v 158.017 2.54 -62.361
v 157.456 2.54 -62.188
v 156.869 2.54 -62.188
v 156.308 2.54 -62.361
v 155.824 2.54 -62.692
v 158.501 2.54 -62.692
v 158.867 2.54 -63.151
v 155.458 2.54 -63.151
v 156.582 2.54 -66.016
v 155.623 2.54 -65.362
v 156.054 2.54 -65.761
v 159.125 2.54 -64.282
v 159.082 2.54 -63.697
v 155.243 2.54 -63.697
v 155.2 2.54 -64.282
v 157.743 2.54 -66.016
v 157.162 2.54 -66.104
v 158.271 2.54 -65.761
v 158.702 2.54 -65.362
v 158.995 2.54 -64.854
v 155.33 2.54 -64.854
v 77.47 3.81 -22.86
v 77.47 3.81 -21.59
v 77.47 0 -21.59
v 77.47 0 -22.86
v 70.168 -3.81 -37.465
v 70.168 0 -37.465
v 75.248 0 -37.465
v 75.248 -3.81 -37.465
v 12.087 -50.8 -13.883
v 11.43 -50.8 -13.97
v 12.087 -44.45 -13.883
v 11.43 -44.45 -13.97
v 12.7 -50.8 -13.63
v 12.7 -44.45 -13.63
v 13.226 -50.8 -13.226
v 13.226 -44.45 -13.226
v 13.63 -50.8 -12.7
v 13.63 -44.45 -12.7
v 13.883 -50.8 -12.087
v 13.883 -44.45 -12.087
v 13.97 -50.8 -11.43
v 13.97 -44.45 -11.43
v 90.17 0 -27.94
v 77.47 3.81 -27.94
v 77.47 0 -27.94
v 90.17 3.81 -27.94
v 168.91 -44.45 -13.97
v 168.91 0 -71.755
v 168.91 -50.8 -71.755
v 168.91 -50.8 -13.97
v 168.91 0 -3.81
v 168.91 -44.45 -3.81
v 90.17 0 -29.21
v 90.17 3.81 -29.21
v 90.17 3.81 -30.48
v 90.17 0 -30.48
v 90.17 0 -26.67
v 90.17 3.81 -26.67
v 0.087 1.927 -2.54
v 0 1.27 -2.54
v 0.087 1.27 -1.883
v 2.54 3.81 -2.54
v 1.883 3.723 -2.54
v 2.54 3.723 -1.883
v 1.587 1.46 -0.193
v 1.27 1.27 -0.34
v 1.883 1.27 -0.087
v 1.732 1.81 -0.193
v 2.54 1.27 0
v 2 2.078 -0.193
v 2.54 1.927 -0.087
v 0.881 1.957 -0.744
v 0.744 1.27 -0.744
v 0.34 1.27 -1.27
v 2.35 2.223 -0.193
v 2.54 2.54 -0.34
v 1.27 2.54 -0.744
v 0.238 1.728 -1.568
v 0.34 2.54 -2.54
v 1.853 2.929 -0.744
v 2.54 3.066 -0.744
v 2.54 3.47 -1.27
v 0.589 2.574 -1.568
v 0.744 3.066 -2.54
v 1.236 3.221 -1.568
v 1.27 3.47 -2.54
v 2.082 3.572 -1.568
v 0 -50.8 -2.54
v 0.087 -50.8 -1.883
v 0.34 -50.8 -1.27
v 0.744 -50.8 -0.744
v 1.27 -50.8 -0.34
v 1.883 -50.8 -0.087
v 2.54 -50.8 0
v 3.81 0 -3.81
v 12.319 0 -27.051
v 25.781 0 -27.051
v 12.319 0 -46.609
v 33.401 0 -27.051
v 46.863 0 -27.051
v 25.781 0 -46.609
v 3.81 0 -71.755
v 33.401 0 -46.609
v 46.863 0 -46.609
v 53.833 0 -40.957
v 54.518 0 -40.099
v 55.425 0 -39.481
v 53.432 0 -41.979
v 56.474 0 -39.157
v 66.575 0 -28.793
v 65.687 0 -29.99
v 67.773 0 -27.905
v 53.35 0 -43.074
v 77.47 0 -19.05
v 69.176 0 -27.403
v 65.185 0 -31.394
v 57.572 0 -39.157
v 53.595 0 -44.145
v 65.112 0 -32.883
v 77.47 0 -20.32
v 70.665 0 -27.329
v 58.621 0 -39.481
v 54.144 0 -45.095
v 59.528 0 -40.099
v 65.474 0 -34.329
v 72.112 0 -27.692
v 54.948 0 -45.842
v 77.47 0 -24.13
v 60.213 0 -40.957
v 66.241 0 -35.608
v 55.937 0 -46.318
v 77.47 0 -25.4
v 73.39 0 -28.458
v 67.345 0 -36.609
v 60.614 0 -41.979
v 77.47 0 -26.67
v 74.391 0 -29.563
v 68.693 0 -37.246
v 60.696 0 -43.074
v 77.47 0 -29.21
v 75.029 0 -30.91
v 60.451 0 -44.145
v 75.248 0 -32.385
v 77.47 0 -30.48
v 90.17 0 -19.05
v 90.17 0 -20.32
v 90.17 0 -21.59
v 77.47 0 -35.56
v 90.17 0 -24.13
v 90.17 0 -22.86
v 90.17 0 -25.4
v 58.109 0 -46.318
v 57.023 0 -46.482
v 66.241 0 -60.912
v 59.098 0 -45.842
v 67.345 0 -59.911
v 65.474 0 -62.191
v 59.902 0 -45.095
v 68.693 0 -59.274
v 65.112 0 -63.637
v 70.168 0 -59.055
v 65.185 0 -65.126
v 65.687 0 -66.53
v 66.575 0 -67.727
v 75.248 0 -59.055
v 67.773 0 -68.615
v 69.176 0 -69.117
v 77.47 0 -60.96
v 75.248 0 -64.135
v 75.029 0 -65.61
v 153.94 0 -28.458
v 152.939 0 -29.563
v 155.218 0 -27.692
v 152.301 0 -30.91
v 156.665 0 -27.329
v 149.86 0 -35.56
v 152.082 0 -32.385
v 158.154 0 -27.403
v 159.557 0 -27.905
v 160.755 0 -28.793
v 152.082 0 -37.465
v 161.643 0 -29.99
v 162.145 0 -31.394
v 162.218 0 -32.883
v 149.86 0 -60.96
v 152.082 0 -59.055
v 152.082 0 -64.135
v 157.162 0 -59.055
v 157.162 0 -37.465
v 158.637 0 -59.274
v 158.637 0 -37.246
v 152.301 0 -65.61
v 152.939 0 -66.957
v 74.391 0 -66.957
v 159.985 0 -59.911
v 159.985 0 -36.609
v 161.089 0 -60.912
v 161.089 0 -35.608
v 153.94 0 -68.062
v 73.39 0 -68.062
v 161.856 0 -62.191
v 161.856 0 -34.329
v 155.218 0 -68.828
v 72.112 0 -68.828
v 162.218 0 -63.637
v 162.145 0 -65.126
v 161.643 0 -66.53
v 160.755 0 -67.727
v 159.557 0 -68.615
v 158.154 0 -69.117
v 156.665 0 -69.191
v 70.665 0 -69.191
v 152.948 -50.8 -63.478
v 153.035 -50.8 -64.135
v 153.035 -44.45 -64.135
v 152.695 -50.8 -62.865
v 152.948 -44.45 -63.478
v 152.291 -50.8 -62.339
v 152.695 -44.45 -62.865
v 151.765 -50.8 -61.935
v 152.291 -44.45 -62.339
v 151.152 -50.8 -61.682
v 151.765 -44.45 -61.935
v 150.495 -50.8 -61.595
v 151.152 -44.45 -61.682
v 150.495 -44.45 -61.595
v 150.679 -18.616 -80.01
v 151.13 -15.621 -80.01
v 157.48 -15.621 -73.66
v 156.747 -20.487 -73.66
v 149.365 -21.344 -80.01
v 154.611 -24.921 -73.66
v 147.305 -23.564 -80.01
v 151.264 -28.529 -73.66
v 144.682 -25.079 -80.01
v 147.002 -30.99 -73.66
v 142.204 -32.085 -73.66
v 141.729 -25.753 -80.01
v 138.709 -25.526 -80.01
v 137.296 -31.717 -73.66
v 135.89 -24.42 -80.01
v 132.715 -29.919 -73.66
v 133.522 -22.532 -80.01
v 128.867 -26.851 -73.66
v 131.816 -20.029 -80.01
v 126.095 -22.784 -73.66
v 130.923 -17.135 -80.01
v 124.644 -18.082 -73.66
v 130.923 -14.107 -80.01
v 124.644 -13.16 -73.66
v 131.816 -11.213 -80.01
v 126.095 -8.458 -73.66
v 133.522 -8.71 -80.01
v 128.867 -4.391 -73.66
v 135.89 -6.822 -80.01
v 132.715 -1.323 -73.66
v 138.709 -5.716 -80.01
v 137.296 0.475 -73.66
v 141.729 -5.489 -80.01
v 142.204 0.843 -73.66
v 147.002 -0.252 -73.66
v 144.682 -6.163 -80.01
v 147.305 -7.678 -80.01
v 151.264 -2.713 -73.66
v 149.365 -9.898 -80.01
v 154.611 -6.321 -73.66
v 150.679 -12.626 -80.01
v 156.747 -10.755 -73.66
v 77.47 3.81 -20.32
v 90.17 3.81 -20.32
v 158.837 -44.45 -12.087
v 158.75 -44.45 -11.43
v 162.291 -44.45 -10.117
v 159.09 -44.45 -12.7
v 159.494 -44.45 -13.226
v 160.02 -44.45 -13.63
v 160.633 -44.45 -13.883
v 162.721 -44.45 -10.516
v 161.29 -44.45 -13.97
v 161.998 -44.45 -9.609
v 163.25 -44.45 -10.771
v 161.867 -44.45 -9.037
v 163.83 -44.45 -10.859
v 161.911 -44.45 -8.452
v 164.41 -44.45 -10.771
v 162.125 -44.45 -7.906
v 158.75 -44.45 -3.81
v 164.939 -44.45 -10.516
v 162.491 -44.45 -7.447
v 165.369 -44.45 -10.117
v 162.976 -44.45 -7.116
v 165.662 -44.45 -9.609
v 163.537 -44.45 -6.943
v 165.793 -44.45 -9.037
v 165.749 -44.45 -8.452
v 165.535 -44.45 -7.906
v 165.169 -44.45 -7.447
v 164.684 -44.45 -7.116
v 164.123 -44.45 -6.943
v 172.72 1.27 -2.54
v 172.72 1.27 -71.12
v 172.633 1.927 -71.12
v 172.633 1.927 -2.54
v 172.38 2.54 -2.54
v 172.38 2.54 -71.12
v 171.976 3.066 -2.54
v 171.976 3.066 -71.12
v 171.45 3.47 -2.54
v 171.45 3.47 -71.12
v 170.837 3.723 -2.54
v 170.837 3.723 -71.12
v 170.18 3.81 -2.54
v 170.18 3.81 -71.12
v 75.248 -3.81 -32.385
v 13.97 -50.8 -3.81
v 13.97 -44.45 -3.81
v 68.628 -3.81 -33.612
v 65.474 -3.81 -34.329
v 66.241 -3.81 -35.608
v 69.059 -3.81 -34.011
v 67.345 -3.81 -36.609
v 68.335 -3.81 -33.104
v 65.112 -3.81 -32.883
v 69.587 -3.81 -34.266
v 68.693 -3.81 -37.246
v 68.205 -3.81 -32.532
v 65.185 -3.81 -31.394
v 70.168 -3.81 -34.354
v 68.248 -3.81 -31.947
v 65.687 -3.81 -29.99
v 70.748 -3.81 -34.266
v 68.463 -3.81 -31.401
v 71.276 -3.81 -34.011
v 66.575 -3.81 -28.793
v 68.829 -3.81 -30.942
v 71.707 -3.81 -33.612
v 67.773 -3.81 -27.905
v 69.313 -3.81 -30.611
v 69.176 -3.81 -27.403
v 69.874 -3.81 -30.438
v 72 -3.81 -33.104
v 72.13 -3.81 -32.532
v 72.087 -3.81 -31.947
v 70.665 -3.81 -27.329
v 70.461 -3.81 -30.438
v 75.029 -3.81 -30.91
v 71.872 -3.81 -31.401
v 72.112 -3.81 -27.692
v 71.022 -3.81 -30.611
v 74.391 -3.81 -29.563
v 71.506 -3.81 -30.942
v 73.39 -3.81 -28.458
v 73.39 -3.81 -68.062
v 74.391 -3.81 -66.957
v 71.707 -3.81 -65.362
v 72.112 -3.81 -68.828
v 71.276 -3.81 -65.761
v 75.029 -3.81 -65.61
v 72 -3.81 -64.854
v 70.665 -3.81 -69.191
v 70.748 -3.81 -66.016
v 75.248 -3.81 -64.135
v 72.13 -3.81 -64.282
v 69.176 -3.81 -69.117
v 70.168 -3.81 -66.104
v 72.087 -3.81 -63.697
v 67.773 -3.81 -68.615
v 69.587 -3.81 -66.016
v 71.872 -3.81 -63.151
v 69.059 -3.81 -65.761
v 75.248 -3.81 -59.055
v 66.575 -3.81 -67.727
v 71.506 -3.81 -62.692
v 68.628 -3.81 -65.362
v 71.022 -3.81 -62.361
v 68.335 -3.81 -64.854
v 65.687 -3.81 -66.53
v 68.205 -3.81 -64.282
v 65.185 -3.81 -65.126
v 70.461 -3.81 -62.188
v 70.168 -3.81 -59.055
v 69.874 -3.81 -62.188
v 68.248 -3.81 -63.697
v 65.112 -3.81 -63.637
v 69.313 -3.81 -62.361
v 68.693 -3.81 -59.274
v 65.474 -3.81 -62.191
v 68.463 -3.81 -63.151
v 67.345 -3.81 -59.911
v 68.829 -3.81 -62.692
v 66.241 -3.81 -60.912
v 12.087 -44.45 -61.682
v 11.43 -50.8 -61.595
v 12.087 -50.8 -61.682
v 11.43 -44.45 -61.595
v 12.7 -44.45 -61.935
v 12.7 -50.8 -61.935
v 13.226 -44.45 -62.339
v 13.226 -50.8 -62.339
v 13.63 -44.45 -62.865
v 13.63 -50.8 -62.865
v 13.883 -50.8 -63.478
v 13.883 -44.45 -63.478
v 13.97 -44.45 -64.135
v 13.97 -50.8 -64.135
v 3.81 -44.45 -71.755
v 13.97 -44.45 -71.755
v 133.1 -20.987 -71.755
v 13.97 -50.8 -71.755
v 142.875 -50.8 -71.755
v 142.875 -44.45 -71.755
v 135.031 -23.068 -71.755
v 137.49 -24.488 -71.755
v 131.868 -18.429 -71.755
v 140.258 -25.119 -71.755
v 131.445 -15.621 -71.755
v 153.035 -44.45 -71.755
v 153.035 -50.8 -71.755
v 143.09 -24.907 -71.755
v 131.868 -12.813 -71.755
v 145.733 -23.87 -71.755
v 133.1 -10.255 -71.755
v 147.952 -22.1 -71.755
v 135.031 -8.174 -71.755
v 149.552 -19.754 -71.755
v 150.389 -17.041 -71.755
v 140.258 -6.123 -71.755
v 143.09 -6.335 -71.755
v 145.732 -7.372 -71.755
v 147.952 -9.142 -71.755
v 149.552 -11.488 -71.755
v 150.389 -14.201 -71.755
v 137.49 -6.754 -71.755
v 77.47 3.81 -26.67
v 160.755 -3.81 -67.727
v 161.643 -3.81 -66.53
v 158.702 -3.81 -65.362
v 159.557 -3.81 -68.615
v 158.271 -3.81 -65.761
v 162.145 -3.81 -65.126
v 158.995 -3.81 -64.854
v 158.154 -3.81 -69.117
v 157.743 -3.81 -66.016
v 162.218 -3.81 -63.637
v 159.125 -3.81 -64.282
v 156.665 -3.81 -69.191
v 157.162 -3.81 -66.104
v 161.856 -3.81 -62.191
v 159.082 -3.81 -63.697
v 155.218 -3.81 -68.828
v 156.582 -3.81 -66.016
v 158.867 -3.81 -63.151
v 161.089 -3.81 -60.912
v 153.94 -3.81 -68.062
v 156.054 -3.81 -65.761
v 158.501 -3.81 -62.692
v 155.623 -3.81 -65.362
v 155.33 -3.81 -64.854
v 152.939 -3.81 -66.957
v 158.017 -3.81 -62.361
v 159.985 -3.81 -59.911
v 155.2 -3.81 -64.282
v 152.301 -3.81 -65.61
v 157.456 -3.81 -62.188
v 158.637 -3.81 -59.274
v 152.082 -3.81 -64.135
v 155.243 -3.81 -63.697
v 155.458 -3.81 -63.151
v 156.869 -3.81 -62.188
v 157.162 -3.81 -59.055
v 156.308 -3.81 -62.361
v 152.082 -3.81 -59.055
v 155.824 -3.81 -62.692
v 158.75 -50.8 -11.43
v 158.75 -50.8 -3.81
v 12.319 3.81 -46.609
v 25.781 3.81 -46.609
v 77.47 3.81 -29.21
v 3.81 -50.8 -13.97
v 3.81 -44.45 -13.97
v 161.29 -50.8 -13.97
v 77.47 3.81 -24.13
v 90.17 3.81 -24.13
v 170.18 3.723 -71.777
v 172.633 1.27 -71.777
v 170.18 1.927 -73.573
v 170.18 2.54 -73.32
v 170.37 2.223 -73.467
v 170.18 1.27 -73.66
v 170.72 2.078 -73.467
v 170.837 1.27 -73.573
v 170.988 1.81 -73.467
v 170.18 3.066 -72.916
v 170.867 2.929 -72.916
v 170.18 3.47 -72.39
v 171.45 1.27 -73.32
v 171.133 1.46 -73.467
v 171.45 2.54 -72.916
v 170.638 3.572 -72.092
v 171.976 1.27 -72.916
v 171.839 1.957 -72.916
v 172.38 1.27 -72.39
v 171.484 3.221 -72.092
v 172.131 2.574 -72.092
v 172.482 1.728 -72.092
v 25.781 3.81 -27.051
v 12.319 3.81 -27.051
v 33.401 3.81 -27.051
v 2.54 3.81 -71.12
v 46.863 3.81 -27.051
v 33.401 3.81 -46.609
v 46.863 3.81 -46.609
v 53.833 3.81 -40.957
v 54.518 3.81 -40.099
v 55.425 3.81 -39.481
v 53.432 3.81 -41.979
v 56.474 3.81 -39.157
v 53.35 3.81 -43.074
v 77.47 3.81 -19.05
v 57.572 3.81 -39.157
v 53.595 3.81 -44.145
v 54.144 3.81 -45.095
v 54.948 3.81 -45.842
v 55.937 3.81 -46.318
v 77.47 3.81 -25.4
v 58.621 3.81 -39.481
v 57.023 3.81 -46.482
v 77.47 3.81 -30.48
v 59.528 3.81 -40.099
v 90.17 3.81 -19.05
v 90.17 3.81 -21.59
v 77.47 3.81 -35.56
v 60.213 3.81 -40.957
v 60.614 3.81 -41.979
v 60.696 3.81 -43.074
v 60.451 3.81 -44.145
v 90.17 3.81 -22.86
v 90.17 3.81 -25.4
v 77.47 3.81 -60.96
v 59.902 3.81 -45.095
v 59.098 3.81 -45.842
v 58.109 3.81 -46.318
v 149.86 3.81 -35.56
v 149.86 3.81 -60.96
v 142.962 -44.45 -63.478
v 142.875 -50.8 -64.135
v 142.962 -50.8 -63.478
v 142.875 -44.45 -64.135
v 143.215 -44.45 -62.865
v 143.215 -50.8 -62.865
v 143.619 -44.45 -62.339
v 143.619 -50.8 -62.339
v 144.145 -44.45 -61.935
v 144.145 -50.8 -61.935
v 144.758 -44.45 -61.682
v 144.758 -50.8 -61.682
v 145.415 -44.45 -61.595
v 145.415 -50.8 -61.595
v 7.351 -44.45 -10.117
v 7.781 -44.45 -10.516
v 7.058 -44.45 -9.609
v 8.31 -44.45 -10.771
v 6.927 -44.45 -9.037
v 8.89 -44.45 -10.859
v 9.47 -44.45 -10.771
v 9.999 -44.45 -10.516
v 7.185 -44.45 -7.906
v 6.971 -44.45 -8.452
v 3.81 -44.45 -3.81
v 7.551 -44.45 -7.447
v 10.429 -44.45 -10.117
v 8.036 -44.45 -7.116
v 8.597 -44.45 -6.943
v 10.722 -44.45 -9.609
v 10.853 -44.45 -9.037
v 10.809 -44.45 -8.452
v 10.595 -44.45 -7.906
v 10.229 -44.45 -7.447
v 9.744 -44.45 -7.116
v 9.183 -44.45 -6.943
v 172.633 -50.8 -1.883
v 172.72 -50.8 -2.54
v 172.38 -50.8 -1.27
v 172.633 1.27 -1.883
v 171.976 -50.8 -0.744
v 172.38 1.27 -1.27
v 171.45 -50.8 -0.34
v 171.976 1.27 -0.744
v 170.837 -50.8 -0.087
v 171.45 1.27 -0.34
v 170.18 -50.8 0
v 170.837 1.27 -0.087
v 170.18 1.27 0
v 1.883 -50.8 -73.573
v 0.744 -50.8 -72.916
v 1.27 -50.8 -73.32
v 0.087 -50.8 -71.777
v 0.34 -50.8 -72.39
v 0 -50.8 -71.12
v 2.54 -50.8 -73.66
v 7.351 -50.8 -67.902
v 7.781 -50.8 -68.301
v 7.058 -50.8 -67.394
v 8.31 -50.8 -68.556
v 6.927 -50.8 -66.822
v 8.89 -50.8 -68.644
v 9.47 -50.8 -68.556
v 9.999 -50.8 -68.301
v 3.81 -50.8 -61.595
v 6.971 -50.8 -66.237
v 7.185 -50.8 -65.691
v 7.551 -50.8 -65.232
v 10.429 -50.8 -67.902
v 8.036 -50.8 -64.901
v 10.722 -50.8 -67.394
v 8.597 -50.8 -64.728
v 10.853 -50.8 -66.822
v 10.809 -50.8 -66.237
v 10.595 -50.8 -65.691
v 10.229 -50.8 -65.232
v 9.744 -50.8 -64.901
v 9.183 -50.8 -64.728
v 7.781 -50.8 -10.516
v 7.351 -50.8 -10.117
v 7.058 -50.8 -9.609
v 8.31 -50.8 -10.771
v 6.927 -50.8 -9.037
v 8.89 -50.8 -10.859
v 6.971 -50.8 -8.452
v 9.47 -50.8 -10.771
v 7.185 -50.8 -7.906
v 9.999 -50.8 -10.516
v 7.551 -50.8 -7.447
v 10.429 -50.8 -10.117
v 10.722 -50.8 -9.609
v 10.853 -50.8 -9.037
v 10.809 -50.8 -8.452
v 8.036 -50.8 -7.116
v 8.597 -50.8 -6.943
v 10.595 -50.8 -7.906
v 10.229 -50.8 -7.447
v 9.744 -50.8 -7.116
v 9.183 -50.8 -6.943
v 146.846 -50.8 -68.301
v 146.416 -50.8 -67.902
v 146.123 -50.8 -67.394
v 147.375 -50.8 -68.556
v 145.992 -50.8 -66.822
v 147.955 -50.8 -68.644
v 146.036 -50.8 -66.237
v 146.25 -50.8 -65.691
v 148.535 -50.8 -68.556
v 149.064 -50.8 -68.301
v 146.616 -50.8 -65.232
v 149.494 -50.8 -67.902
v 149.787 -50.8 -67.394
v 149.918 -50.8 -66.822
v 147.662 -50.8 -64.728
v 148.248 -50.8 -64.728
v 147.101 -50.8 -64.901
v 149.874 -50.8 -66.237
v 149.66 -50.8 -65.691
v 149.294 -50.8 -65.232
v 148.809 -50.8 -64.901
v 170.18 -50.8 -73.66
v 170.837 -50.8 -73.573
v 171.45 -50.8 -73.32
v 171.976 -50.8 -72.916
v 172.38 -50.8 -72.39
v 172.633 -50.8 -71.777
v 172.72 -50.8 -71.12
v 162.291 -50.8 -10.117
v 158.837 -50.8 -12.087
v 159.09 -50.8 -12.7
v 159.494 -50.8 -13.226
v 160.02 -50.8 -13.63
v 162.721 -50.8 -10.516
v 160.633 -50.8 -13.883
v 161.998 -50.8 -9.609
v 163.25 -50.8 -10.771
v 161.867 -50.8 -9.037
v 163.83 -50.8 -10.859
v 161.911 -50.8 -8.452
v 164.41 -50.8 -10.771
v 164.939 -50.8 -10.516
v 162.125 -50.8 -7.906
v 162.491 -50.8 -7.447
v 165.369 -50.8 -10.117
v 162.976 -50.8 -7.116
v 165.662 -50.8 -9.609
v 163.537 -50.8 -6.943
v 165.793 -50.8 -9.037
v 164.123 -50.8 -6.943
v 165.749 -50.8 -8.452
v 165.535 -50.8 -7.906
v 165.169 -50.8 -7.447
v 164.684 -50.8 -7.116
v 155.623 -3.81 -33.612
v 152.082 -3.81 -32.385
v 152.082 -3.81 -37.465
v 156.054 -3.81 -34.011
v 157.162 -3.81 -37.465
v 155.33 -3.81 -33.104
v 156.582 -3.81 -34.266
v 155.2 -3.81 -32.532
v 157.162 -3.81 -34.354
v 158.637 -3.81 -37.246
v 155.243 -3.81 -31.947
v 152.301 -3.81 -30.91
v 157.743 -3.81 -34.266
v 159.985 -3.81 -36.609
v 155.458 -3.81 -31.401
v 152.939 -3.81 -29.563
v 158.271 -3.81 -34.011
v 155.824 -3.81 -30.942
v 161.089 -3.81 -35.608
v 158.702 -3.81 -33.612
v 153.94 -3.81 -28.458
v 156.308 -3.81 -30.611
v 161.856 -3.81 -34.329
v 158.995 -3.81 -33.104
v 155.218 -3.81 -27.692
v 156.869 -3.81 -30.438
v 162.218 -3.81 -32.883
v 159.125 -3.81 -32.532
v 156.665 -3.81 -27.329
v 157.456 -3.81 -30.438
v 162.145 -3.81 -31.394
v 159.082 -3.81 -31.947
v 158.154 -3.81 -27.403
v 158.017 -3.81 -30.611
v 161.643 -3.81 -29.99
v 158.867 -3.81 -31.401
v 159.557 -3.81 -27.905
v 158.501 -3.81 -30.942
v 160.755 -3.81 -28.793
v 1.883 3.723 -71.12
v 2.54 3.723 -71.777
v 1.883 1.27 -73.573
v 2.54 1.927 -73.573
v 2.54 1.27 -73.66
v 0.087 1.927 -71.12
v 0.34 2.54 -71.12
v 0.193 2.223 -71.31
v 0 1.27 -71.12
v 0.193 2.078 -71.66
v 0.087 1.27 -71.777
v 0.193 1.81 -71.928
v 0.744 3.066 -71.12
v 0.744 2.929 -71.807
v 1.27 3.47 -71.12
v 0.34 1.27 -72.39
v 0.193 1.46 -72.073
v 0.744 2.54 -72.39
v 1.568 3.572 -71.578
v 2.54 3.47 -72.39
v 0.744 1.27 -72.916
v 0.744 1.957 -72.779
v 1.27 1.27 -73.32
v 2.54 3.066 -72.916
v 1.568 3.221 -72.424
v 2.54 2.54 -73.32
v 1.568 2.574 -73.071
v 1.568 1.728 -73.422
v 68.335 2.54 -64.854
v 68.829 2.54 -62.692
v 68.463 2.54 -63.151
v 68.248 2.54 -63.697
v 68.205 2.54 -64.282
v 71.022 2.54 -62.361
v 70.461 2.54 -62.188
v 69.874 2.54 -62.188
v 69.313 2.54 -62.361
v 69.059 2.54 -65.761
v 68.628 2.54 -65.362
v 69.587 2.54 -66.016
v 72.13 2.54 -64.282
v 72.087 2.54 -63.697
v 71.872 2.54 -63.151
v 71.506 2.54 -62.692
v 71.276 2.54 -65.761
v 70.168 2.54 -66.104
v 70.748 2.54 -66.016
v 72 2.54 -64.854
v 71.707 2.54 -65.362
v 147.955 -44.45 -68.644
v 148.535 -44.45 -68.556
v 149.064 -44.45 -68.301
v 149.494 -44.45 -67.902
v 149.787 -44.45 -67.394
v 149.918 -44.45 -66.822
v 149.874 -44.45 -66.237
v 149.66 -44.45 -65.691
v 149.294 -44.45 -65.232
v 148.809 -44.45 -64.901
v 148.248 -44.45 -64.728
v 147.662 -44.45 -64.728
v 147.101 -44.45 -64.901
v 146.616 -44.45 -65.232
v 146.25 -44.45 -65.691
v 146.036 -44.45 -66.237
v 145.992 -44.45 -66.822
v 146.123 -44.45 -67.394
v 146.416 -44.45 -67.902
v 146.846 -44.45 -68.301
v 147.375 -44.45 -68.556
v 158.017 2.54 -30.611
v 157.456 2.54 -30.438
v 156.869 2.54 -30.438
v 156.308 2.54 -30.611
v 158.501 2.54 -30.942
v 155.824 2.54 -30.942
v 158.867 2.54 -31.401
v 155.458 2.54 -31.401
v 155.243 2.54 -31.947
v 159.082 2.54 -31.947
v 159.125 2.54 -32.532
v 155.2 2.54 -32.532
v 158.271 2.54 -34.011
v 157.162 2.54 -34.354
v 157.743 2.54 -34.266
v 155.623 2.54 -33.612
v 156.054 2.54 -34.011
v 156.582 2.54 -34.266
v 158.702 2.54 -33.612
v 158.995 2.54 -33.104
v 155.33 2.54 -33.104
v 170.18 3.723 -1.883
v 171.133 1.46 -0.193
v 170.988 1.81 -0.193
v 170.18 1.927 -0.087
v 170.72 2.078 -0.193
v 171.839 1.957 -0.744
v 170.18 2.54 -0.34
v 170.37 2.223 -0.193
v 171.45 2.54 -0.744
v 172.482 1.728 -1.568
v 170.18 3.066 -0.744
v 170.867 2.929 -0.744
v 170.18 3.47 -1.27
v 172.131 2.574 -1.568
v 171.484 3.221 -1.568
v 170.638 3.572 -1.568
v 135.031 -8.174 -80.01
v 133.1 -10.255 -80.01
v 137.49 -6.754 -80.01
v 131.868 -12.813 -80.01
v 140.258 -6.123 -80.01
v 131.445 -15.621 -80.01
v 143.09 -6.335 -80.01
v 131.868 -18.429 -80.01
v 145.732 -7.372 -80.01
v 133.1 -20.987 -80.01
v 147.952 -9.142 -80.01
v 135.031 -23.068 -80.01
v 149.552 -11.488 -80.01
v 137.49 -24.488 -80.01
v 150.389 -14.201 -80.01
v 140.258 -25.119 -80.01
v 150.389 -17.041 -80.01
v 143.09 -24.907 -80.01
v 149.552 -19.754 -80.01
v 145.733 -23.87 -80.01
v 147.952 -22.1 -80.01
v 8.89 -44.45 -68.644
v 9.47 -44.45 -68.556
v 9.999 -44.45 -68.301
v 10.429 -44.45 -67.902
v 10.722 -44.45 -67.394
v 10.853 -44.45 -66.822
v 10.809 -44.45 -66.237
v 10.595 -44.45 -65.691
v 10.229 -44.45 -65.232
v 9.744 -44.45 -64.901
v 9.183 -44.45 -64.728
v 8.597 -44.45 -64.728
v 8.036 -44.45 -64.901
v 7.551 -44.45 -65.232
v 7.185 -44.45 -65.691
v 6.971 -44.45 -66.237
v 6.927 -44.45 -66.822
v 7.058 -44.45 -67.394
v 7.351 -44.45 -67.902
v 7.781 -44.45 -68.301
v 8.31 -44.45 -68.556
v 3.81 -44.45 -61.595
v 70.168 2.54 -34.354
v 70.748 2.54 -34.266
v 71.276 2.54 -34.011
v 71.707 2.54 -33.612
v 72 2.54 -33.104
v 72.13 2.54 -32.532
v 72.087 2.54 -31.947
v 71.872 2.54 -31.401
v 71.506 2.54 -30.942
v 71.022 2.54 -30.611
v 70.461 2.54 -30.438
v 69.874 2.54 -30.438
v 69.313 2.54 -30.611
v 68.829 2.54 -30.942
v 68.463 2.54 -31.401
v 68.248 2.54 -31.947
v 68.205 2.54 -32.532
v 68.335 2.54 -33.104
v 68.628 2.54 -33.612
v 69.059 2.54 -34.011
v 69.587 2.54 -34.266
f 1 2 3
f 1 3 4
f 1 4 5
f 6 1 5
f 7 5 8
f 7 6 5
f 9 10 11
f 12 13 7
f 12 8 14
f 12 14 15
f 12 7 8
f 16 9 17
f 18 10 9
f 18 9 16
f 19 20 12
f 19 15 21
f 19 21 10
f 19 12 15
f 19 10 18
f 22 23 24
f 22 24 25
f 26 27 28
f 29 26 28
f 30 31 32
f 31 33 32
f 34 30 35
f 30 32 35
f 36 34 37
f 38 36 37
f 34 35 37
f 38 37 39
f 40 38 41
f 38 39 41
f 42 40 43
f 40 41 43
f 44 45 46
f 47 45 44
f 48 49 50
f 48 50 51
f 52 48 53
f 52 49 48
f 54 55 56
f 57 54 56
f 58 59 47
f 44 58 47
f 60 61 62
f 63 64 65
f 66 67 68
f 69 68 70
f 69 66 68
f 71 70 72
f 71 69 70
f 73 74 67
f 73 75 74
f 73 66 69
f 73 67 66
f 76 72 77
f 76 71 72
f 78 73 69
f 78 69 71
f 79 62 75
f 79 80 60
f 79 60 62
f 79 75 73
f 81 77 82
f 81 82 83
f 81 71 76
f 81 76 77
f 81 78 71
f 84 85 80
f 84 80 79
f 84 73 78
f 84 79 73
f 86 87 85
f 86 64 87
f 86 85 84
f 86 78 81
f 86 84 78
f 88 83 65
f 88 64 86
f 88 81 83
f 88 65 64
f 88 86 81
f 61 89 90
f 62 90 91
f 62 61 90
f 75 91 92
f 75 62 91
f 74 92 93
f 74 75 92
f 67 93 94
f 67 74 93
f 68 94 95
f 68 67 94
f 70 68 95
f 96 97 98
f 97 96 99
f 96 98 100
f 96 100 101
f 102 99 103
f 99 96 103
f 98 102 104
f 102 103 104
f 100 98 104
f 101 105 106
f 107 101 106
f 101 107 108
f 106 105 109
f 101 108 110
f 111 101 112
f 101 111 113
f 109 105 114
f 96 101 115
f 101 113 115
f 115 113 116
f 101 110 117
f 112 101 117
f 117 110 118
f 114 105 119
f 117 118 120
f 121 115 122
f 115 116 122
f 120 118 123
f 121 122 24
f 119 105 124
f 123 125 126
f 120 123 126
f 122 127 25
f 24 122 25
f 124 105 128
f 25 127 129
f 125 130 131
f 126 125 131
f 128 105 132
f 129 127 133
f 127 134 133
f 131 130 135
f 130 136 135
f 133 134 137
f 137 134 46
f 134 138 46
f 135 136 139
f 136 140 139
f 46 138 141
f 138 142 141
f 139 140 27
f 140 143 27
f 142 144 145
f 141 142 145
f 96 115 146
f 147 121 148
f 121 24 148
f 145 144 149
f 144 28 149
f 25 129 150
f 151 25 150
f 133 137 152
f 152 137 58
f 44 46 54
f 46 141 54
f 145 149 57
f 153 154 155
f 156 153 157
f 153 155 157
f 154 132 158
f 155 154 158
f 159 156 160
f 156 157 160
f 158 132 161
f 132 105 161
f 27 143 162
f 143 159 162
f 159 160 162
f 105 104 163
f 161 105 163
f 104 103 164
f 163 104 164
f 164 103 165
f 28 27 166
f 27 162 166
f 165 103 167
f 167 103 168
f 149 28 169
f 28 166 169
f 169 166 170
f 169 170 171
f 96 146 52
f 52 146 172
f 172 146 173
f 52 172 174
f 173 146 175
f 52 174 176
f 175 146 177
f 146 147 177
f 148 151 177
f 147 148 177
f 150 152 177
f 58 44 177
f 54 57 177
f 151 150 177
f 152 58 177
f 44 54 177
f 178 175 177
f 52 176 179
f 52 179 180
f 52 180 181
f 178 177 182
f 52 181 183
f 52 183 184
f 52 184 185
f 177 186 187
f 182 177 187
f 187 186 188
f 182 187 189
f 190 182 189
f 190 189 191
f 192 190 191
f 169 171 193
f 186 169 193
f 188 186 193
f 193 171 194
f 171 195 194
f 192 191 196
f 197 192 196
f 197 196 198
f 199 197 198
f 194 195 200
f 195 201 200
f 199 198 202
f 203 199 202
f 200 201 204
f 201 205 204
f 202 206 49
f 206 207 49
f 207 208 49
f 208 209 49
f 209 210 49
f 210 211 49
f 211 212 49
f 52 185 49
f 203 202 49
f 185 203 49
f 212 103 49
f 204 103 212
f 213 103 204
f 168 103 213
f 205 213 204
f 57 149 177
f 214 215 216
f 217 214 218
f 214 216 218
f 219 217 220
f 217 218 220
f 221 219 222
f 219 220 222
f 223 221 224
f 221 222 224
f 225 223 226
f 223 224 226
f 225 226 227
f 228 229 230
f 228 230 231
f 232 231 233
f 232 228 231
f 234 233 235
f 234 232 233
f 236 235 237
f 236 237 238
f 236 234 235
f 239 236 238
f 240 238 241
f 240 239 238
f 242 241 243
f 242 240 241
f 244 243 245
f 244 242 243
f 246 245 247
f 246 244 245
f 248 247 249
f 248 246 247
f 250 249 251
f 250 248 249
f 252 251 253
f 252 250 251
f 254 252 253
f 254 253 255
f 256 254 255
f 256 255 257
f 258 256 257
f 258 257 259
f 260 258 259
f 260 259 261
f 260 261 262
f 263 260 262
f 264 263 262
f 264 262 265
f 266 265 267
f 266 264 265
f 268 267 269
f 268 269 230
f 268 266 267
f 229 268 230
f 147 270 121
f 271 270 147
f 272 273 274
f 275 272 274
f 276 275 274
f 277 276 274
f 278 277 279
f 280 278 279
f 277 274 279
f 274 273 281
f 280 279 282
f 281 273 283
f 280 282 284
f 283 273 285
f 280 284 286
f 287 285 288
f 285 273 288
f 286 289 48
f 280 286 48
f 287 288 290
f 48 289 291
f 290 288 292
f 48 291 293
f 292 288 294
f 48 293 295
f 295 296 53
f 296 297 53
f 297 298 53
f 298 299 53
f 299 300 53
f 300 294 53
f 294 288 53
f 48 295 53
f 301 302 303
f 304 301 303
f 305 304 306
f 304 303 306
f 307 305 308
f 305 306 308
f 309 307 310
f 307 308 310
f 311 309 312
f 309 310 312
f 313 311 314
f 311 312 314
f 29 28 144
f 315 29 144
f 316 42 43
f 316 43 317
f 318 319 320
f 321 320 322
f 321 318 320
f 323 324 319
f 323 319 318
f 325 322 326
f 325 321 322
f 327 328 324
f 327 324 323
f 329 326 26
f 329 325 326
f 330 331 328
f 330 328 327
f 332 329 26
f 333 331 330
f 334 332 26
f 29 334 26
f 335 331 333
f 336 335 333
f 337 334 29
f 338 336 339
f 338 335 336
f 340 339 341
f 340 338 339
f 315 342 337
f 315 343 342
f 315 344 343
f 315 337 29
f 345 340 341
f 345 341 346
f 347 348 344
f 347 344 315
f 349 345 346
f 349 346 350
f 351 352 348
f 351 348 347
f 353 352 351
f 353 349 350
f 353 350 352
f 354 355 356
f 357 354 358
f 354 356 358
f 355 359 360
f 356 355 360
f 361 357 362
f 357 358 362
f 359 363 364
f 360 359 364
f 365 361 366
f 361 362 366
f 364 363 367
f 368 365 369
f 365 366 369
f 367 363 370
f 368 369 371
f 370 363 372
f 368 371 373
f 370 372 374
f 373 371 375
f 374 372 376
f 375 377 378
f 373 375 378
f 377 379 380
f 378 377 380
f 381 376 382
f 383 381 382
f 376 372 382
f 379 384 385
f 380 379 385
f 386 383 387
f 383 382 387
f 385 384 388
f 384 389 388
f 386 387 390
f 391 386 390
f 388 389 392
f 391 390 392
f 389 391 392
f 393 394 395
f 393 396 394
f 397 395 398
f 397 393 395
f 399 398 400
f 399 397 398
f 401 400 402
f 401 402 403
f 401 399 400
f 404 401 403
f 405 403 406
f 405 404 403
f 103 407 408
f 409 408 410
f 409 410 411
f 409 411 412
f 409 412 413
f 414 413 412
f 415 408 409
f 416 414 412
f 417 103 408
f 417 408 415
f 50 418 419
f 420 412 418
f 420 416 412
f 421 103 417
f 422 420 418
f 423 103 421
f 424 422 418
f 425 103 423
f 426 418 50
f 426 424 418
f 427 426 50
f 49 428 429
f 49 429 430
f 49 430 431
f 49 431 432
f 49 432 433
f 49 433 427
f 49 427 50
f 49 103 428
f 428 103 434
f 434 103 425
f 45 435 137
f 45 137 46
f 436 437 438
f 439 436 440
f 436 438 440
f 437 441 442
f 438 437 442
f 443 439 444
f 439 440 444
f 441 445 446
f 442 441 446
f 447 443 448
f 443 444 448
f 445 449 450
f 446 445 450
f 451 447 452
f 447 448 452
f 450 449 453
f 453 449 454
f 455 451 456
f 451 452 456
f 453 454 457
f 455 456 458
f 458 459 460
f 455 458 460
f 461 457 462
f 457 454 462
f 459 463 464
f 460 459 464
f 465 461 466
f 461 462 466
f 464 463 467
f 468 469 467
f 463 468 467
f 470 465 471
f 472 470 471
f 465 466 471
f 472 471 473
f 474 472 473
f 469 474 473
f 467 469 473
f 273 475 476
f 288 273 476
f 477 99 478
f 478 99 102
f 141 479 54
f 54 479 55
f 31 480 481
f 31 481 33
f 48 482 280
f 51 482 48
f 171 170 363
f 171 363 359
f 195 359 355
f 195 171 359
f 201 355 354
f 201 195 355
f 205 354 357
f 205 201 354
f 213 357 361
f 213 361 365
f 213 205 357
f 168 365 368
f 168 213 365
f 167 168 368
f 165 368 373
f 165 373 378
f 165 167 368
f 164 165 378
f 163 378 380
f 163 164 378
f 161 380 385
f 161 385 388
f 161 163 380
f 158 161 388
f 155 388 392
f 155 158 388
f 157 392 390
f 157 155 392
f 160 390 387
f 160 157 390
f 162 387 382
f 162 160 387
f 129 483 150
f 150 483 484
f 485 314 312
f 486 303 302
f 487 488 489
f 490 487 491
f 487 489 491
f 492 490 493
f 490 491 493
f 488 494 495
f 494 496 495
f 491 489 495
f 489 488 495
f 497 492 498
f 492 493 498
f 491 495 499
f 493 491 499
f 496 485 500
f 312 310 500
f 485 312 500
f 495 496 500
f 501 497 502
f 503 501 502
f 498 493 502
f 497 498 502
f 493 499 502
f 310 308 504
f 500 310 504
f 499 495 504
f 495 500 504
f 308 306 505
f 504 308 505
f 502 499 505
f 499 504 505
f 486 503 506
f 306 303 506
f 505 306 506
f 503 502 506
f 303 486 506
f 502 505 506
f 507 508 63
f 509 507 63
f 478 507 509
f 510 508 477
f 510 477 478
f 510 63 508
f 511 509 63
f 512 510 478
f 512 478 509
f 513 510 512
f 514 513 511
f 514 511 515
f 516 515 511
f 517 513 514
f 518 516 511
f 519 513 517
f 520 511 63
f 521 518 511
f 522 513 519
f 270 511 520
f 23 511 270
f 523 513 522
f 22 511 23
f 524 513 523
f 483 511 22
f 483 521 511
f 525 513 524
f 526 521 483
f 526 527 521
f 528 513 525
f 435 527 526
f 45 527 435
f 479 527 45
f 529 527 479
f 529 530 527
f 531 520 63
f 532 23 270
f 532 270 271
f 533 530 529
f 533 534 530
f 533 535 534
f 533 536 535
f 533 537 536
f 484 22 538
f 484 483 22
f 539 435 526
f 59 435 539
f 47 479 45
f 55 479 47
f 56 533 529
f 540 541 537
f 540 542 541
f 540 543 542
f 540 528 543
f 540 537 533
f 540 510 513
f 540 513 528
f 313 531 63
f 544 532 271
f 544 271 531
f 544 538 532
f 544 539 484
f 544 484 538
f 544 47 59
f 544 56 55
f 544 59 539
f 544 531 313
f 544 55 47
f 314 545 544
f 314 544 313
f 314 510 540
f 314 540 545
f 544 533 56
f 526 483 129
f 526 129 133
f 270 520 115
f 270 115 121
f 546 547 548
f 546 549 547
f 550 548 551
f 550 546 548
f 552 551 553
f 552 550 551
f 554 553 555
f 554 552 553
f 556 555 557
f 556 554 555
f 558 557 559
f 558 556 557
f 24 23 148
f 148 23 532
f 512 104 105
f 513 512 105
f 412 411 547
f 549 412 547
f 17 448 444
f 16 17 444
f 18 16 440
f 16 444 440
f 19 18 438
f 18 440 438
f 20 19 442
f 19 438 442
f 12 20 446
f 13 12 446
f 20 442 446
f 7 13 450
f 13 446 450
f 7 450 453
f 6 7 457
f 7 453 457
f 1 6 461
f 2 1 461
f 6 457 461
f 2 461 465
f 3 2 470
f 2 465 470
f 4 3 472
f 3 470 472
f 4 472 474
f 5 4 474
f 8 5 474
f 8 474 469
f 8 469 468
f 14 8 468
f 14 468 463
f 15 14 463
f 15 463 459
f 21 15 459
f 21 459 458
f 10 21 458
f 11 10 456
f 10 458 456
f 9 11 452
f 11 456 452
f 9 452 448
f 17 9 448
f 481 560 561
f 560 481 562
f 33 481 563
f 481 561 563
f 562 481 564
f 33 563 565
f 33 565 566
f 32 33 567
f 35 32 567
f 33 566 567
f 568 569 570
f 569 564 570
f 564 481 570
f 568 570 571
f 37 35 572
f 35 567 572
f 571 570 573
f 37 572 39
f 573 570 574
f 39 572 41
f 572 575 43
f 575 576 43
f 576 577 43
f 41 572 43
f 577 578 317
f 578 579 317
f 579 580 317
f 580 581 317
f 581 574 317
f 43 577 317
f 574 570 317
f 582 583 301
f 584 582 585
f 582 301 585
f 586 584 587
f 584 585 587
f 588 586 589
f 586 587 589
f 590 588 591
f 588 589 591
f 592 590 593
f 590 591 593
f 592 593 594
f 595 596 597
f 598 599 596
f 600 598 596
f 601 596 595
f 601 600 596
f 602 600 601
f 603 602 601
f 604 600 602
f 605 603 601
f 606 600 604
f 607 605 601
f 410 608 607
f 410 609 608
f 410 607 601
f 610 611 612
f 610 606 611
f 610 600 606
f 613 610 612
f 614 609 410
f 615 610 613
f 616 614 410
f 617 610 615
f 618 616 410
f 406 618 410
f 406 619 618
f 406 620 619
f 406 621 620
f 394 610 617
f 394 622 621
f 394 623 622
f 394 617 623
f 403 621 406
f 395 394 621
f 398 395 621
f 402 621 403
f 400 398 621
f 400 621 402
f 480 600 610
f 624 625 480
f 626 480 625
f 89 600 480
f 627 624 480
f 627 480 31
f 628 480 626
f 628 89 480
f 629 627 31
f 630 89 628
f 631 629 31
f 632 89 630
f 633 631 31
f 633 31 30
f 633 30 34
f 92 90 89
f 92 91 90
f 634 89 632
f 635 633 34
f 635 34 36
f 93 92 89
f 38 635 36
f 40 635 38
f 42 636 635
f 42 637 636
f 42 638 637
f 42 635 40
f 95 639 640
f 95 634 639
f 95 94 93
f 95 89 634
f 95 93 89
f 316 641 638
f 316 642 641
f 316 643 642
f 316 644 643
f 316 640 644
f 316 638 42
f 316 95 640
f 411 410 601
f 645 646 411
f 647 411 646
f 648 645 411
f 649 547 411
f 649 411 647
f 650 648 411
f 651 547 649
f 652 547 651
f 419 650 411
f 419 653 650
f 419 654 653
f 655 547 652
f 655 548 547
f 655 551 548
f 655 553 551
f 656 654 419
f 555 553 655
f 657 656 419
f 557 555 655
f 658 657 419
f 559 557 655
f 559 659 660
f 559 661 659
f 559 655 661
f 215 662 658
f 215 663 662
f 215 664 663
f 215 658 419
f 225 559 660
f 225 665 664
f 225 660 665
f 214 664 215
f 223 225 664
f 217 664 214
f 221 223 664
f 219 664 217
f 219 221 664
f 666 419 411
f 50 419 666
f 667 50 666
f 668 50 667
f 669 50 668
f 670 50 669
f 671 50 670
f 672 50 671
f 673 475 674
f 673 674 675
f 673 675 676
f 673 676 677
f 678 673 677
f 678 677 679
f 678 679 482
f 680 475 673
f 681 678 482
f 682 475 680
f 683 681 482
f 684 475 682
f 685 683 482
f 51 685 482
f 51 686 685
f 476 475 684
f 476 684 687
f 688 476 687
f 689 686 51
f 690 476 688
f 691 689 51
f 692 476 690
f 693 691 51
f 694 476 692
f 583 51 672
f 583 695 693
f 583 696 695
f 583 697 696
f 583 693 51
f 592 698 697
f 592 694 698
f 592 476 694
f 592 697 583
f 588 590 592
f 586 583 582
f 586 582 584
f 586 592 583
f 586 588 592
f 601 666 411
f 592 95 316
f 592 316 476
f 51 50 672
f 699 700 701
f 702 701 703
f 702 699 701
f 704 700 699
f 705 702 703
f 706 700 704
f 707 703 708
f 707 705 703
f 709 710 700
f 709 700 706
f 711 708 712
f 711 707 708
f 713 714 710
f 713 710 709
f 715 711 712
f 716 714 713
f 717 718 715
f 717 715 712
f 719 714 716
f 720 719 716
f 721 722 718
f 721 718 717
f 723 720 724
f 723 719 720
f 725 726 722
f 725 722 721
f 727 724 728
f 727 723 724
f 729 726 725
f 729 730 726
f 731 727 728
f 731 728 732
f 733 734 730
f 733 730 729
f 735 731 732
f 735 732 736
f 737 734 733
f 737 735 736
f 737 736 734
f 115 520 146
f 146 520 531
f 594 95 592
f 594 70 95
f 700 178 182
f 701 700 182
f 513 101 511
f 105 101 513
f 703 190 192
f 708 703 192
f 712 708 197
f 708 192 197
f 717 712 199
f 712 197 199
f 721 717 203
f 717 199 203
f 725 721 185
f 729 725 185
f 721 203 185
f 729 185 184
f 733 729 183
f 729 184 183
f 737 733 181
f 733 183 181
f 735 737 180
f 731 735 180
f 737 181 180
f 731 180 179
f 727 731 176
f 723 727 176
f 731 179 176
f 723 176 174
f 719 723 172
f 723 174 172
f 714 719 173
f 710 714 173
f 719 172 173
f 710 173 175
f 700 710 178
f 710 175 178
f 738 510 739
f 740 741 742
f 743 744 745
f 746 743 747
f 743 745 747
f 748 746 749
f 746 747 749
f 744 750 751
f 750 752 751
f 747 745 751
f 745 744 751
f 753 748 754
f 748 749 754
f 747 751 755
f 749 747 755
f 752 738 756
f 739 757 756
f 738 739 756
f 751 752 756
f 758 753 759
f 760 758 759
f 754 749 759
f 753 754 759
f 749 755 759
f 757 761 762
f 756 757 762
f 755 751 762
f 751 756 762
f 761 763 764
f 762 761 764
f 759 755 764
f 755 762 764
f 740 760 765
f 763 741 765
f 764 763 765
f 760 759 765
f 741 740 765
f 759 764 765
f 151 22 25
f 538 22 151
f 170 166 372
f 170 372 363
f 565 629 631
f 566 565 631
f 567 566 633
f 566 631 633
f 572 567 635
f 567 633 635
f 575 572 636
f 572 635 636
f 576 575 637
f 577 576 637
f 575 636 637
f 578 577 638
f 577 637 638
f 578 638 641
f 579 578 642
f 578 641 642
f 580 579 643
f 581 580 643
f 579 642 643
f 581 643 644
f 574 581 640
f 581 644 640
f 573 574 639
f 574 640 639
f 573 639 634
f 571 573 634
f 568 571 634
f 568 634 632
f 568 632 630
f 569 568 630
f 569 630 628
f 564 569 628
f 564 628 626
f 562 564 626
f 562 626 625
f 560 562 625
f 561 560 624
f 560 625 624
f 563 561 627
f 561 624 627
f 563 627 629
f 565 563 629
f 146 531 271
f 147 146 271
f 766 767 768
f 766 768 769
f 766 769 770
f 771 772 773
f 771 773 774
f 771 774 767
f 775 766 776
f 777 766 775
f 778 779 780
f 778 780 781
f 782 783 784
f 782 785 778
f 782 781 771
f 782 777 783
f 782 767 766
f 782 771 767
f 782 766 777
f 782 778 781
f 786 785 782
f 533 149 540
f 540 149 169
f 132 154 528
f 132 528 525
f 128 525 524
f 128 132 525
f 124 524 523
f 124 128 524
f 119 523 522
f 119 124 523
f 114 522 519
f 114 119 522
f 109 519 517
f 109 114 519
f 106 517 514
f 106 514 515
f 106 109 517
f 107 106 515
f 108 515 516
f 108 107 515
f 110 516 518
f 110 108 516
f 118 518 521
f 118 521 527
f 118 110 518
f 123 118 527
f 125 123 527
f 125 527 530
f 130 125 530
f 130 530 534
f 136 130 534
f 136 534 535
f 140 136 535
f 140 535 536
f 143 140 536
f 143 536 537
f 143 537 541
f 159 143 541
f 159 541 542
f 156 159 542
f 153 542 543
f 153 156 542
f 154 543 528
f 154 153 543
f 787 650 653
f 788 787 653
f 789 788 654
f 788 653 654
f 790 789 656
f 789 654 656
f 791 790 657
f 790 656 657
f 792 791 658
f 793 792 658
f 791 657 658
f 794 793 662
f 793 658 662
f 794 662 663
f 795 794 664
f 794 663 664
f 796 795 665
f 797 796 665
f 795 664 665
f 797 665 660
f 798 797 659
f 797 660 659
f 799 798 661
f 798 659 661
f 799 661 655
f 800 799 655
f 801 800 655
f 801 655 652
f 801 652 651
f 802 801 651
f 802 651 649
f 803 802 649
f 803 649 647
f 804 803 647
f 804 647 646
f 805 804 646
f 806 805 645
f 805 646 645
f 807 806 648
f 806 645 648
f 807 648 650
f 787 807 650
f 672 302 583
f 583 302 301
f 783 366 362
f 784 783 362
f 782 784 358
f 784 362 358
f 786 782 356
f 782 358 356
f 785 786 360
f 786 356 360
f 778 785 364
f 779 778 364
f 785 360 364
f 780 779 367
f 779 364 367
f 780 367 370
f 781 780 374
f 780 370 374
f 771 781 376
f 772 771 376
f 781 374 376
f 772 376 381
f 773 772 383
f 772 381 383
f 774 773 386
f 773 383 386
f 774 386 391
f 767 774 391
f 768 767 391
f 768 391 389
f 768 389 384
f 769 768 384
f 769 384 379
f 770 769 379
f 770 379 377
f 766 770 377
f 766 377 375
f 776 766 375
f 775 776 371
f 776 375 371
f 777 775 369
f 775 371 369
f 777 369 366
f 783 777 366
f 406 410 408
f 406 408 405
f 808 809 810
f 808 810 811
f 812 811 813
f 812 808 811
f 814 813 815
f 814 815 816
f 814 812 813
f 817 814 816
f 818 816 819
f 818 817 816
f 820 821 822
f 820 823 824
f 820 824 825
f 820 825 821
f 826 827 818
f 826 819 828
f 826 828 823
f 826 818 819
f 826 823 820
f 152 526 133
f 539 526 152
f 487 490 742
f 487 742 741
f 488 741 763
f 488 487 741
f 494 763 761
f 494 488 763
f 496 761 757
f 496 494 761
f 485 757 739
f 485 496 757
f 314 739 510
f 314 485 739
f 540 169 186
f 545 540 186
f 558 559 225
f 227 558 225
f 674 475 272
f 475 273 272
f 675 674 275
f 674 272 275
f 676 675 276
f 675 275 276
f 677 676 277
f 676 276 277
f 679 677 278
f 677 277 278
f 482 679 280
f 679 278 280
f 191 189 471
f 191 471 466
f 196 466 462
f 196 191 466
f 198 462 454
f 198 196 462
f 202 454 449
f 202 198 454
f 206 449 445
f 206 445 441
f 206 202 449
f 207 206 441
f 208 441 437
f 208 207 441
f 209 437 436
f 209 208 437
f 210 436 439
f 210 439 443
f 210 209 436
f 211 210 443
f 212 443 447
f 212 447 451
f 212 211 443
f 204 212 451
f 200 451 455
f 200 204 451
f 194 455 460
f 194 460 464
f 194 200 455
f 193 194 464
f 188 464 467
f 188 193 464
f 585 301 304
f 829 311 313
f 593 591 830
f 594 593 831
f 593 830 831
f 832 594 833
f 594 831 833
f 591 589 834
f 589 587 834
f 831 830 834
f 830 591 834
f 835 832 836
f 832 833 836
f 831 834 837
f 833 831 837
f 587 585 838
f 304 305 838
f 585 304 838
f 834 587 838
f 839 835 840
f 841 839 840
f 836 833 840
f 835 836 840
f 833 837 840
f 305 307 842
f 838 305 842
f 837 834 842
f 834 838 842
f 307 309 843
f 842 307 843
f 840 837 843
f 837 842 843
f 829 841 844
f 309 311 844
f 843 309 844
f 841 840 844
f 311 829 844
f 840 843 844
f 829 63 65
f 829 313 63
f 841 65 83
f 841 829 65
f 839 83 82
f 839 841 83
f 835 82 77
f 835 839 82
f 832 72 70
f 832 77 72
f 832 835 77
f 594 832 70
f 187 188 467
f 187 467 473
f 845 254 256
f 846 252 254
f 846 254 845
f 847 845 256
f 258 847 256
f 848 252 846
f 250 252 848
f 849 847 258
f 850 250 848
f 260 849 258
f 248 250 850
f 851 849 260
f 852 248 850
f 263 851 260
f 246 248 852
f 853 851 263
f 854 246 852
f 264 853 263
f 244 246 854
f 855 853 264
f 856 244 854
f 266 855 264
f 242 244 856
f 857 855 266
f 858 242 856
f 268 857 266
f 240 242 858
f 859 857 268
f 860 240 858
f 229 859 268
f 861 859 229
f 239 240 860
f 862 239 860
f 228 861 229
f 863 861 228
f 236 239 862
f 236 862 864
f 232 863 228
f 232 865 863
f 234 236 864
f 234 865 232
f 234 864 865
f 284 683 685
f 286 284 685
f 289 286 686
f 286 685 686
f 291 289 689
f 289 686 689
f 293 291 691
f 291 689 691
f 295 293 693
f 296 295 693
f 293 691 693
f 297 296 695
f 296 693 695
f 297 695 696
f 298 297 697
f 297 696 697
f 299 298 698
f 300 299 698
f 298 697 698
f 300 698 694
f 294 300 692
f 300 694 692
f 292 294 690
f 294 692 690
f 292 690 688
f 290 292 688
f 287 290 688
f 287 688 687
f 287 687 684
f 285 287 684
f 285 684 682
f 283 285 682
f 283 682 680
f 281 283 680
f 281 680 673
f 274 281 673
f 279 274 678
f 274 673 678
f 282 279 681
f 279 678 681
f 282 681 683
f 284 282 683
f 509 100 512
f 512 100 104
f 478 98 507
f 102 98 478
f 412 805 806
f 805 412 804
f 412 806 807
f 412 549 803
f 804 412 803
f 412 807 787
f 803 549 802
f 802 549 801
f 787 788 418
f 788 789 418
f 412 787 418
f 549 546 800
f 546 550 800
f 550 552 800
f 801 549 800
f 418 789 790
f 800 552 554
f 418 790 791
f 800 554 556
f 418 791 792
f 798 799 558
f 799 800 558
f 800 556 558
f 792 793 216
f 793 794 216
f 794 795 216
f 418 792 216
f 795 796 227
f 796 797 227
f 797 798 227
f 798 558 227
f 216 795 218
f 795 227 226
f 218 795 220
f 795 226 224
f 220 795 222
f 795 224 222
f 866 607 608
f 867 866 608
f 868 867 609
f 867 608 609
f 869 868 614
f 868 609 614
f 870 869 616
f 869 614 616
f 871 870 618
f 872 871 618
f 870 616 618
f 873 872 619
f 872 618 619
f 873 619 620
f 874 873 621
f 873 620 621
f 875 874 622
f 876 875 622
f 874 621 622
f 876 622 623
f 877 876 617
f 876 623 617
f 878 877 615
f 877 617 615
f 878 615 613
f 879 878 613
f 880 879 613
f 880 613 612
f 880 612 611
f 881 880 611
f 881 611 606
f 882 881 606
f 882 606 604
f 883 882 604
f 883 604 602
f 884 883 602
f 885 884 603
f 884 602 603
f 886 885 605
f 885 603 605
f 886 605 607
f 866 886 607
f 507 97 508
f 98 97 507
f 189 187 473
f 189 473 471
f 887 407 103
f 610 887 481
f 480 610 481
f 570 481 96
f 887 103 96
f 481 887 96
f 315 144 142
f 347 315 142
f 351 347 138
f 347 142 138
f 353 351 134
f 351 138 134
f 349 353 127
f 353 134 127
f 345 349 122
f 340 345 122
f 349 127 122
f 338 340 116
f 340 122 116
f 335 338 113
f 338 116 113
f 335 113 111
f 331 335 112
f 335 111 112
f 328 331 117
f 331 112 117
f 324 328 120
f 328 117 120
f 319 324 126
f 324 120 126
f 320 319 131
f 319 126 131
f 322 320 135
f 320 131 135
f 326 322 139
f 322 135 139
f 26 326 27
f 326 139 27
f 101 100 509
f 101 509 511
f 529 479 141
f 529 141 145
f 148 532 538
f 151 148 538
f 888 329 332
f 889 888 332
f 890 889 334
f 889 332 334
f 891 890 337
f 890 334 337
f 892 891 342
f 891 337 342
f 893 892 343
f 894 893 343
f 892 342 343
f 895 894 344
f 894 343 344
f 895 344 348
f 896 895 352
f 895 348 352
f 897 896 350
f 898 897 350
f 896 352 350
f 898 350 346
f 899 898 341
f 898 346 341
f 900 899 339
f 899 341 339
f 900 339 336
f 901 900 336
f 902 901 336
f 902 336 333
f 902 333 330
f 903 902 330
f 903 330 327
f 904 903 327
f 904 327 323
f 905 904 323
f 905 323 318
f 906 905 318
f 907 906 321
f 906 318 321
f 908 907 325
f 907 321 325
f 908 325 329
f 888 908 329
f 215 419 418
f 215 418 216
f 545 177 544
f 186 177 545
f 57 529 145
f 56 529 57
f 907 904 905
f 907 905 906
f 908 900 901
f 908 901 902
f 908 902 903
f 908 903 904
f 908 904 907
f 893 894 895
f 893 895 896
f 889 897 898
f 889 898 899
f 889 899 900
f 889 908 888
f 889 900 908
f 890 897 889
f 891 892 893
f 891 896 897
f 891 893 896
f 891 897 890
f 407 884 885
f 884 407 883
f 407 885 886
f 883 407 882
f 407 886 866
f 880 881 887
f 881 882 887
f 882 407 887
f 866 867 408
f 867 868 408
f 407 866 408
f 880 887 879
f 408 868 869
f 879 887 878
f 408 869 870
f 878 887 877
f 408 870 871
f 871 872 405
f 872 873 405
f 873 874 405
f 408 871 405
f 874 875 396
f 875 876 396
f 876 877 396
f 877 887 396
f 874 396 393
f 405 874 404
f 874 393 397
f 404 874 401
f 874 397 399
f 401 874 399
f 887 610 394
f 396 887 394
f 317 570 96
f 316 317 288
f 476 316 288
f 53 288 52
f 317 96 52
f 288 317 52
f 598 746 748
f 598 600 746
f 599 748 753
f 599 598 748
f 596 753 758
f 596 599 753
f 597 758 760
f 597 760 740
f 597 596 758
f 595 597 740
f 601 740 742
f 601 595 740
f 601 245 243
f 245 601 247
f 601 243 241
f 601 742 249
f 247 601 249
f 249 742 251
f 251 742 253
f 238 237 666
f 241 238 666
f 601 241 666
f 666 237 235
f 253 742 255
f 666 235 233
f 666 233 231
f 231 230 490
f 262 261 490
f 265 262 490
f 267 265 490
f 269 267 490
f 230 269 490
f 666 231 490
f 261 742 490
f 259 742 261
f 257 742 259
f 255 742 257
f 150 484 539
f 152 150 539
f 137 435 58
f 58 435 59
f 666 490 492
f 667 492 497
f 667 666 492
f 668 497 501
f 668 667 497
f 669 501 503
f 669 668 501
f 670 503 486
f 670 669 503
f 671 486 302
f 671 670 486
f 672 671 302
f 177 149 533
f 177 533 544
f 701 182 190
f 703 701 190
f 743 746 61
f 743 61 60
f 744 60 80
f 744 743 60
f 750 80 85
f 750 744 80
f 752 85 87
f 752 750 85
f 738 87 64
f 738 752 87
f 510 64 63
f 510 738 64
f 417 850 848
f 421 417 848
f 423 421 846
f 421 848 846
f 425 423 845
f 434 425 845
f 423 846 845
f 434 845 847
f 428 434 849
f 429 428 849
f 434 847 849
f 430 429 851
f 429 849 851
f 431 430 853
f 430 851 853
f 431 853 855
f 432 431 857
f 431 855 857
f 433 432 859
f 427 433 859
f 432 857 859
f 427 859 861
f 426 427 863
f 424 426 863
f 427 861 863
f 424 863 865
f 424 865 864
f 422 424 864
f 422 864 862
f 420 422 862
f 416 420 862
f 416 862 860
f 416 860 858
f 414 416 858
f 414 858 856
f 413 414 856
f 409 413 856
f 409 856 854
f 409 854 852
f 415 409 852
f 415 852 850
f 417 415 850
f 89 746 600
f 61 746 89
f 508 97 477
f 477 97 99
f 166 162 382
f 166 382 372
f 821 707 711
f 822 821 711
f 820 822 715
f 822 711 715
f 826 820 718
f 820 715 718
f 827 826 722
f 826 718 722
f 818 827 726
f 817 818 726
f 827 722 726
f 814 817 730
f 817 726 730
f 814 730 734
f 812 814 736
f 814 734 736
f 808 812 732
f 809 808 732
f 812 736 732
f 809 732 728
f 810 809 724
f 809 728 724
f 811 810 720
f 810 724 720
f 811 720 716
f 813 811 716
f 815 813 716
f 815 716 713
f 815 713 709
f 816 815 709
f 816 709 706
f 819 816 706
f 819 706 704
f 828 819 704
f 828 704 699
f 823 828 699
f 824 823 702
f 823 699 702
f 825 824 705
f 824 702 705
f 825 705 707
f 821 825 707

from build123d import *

# Parameters (mm, degrees)
SKETCH1_W           = 172.72
SKETCH1_H           = 73.66
SKETCH1_R           = 3.683
SKETCH1_W_2         = 72.39
SKETCH1_H_2         = 25.4
SKETCH1_W_3         = 13.462
SKETCH1_H_3         = 19.558
BOSS_EXTRUDE1_DEPTH = 3.81
BOSS_EXTRUDE2_DEPTH = 3.81
SKETCH3_R           = 1.9685
CUT_EXTRUDE1_DEPTH  = 6.35
SKETCH4_W           = 172.72
SKETCH4_H           = 73.66
SKETCH4_W_2         = 165.1
SKETCH4_H_2         = 67.945
BOSS_EXTRUDE4_DEPTH = 50.8
FILLET1_R           = 2.54
SKETCH5_W           = 10.16
SKETCH5_H           = 10.16
BOSS_EXTRUDE5_DEPTH = 6.35
FILLET2_R           = 2.54
SKETCH6_R           = 1.9685
CUT_EXTRUDE2_DEPTH  = 6.35
SKETCH7_W           = 12.7
SKETCH7_H           = 1.27
CUT_EXTRUDE3_DEPTH  = 3.81
SKETCH8_R           = 9.525
CUT_EXTRUDE4_DEPTH  = 2.54
BOSS_EXTRUDE6_START = 6.35
SKETCH9_R           = 16.51
SKETCH9_R_2         = 9.525
BOSS_EXTRUDE6_DEPTH = 6.35
CHAMFER1_SIZE       = 6.35


with BuildPart() as part:
    # Sketch1 → Boss-Extrude1 (new body)
    with BuildSketch(Plane(origin=(0, 0, 0), x_dir=(1, 0, 0), z_dir=(0, 1, 0))):
        with Locations((86.36, 36.83)):
            Rectangle(SKETCH1_W, SKETCH1_H)
        with Locations(Location((57.023, 42.799, 0), (0, 0, 90))):
            Circle(SKETCH1_R, mode=Mode.SUBTRACT)
        with Locations((113.665, 48.26)):
            Rectangle(SKETCH1_W_2, SKETCH1_H_2, mode=Mode.SUBTRACT)
        with Locations((19.05, 36.83)):
            Rectangle(SKETCH1_W_3, SKETCH1_H_3, mode=Mode.SUBTRACT)
        with Locations((40.132, 36.83)):
            Rectangle(SKETCH1_W_3, SKETCH1_H_3, mode=Mode.SUBTRACT)
    extrude(amount=BOSS_EXTRUDE1_DEPTH)

    # Sketch2 → Boss-Extrude2 (add)
    with BuildSketch(Plane.XZ):
        with BuildLine():
            Line((70.1675, -37.465), (75.2475, -37.465))
            Line((75.2475, -37.465), (75.2475, -32.385))
            ThreePointArc((75.2475, -32.385), (66.575397552, -28.792897552), (70.1675, -37.465))
        make_face()
        with BuildLine():
            Line((70.1675, -59.055), (75.2475, -59.055))
            Line((75.2475, -59.055), (75.2475, -64.135))
            ThreePointArc((75.2475, -64.135), (66.575397552, -67.727102448), (70.1675, -59.055))
        make_face()
        with BuildLine():
            Line((152.0825, -32.385), (152.0825, -37.465))
            Line((152.0825, -37.465), (157.1625, -37.465))
            ThreePointArc((157.1625, -37.465), (160.754602448, -28.792897552), (152.0825, -32.385))
        make_face()
        with BuildLine():
            Line((152.0825, -64.135), (152.0825, -59.055))
            Line((152.0825, -59.055), (157.1625, -59.055))
            ThreePointArc((157.1625, -59.055), (160.754602448, -67.727102448), (152.0825, -64.135))
        make_face()
    extrude(amount=BOSS_EXTRUDE2_DEPTH)

    # Sketch3 → Cut-Extrude1 (cut)
    with BuildSketch(Plane.XZ.offset(3.81)):
        with Locations(Location((70.1675, -32.385, 0), (0, 0, 270))):
            Circle(SKETCH3_R)
        with Locations(Location((70.1675, -64.135, 0), (0, 0, 270))):
            Circle(SKETCH3_R)
        with Locations(Location((157.1625, -64.135, 0), (0, 0, 270))):
            Circle(SKETCH3_R)
        with Locations(Location((157.1625, -32.385, 0), (0, 0, 270))):
            Circle(SKETCH3_R)
    extrude(amount=-CUT_EXTRUDE1_DEPTH, mode=Mode.SUBTRACT)

    # Sketch4 → Boss-Extrude4 (add)
    with BuildSketch(Plane.XZ):
        with Locations((86.36, -36.83)):
            Rectangle(SKETCH4_W, SKETCH4_H)
        with Locations((86.36, -37.7825)):
            Rectangle(SKETCH4_W_2, SKETCH4_H_2, mode=Mode.SUBTRACT)
    extrude(amount=BOSS_EXTRUDE4_DEPTH)

    # Fillet1
    fillet1_edges = [part.edges().sort_by_distance(p)[0] for p in [
        (172.72, 3.81, -36.83),
        (86.36, 3.81, -73.66),
        (0, 3.81, -36.83),
        (0, -23.495, -73.66),
        (172.72, -23.495, -73.66),
        (172.72, -23.495, 0),
        (0, -23.495, 0),
        (86.36, 3.81, 0),
    ]]
    fillet(fillet1_edges, radius=FILLET1_R)

    # Sketch5 → Boss-Extrude5 (add)
    with BuildSketch(Plane.XZ.offset(50.8)):
        with Locations((8.89, -8.89)):
            Rectangle(SKETCH5_W, SKETCH5_H)
        with Locations((8.89, -66.675)):
            Rectangle(SKETCH5_W, SKETCH5_H)
        with Locations((163.83, -8.89)):
            Rectangle(SKETCH5_W, SKETCH5_H)
        with Locations((147.955, -66.675)):
            Rectangle(SKETCH5_W, SKETCH5_H)
    extrude(amount=-BOSS_EXTRUDE5_DEPTH)

    # Fillet2
    fillet2_edges = [part.edges().sort_by_distance(p)[0] for p in [
        (13.97, -47.625, -13.97),
        (13.97, -47.625, -61.595),
        (153.035, -47.625, -61.595),
        (142.875, -47.625, -61.595),
        (158.75, -47.625, -13.97),
    ]]
    fillet(fillet2_edges, radius=FILLET2_R)

    # Sketch6 → Cut-Extrude2 (cut)
    with BuildSketch(Plane.XZ.offset(50.8)):
        with Locations(Location((8.89, -66.675, 0), (0, 0, 270))):
            Circle(SKETCH6_R)
        with Locations(Location((8.89, -8.89, 0), (0, 0, 270))):
            Circle(SKETCH6_R)
        with Locations(Location((163.83, -8.89, 0), (0, 0, 270))):
            Circle(SKETCH6_R)
        with Locations(Location((147.955, -66.675, 0), (0, 0, 270))):
            Circle(SKETCH6_R)
    extrude(amount=-CUT_EXTRUDE2_DEPTH, mode=Mode.SUBTRACT)

    # Sketch7 → Cut-Extrude3 (cut)
    with BuildSketch(Plane(origin=(0, 3.81, 0), x_dir=(1, 0, 0), z_dir=(0, 1, 0))):
        with Locations((83.82, 29.845)):
            Rectangle(SKETCH7_W, SKETCH7_H)
        with Locations((83.82, 27.305)):
            Rectangle(SKETCH7_W, SKETCH7_H)
        with Locations((83.82, 24.765)):
            Rectangle(SKETCH7_W, SKETCH7_H)
        with Locations((83.82, 22.225)):
            Rectangle(SKETCH7_W, SKETCH7_H)
        with Locations((83.82, 19.685)):
            Rectangle(SKETCH7_W, SKETCH7_H)
    extrude(amount=-CUT_EXTRUDE3_DEPTH, mode=Mode.SUBTRACT)

    # Sketch8 → Cut-Extrude4 (cut)
    with BuildSketch(Plane(origin=(0, 0, -73.66), x_dir=(-1, 0, 0), z_dir=(0, 0, -1))):
        with Locations((-140.97, -15.621)):
            Circle(SKETCH8_R)
    extrude(amount=-CUT_EXTRUDE4_DEPTH, mode=Mode.SUBTRACT)

    # Sketch9 → Boss-Extrude6 (add)
    with BuildSketch(Plane(origin=(0, 0, -73.66), x_dir=(-1, 0, 0), z_dir=(0, 0, -1)).offset(BOSS_EXTRUDE6_START)):
        with Locations(Location((-140.97, -15.621, 0), (0, 0, 180))):
            Circle(SKETCH9_R)
        with Locations((-140.97, -15.621)):
            Circle(SKETCH9_R_2, mode=Mode.SUBTRACT)
    extrude(amount=-BOSS_EXTRUDE6_DEPTH)

    # Chamfer1
    chamfer1_edges = [part.edges().sort_by_distance(p)[0] for p in [
        (124.46, -15.621, -80.01),
    ]]
    chamfer(chamfer1_edges, length=CHAMFER1_SIZE - 0.0001)  # a hair under: the kernel refuses the full size


solid = part.part
